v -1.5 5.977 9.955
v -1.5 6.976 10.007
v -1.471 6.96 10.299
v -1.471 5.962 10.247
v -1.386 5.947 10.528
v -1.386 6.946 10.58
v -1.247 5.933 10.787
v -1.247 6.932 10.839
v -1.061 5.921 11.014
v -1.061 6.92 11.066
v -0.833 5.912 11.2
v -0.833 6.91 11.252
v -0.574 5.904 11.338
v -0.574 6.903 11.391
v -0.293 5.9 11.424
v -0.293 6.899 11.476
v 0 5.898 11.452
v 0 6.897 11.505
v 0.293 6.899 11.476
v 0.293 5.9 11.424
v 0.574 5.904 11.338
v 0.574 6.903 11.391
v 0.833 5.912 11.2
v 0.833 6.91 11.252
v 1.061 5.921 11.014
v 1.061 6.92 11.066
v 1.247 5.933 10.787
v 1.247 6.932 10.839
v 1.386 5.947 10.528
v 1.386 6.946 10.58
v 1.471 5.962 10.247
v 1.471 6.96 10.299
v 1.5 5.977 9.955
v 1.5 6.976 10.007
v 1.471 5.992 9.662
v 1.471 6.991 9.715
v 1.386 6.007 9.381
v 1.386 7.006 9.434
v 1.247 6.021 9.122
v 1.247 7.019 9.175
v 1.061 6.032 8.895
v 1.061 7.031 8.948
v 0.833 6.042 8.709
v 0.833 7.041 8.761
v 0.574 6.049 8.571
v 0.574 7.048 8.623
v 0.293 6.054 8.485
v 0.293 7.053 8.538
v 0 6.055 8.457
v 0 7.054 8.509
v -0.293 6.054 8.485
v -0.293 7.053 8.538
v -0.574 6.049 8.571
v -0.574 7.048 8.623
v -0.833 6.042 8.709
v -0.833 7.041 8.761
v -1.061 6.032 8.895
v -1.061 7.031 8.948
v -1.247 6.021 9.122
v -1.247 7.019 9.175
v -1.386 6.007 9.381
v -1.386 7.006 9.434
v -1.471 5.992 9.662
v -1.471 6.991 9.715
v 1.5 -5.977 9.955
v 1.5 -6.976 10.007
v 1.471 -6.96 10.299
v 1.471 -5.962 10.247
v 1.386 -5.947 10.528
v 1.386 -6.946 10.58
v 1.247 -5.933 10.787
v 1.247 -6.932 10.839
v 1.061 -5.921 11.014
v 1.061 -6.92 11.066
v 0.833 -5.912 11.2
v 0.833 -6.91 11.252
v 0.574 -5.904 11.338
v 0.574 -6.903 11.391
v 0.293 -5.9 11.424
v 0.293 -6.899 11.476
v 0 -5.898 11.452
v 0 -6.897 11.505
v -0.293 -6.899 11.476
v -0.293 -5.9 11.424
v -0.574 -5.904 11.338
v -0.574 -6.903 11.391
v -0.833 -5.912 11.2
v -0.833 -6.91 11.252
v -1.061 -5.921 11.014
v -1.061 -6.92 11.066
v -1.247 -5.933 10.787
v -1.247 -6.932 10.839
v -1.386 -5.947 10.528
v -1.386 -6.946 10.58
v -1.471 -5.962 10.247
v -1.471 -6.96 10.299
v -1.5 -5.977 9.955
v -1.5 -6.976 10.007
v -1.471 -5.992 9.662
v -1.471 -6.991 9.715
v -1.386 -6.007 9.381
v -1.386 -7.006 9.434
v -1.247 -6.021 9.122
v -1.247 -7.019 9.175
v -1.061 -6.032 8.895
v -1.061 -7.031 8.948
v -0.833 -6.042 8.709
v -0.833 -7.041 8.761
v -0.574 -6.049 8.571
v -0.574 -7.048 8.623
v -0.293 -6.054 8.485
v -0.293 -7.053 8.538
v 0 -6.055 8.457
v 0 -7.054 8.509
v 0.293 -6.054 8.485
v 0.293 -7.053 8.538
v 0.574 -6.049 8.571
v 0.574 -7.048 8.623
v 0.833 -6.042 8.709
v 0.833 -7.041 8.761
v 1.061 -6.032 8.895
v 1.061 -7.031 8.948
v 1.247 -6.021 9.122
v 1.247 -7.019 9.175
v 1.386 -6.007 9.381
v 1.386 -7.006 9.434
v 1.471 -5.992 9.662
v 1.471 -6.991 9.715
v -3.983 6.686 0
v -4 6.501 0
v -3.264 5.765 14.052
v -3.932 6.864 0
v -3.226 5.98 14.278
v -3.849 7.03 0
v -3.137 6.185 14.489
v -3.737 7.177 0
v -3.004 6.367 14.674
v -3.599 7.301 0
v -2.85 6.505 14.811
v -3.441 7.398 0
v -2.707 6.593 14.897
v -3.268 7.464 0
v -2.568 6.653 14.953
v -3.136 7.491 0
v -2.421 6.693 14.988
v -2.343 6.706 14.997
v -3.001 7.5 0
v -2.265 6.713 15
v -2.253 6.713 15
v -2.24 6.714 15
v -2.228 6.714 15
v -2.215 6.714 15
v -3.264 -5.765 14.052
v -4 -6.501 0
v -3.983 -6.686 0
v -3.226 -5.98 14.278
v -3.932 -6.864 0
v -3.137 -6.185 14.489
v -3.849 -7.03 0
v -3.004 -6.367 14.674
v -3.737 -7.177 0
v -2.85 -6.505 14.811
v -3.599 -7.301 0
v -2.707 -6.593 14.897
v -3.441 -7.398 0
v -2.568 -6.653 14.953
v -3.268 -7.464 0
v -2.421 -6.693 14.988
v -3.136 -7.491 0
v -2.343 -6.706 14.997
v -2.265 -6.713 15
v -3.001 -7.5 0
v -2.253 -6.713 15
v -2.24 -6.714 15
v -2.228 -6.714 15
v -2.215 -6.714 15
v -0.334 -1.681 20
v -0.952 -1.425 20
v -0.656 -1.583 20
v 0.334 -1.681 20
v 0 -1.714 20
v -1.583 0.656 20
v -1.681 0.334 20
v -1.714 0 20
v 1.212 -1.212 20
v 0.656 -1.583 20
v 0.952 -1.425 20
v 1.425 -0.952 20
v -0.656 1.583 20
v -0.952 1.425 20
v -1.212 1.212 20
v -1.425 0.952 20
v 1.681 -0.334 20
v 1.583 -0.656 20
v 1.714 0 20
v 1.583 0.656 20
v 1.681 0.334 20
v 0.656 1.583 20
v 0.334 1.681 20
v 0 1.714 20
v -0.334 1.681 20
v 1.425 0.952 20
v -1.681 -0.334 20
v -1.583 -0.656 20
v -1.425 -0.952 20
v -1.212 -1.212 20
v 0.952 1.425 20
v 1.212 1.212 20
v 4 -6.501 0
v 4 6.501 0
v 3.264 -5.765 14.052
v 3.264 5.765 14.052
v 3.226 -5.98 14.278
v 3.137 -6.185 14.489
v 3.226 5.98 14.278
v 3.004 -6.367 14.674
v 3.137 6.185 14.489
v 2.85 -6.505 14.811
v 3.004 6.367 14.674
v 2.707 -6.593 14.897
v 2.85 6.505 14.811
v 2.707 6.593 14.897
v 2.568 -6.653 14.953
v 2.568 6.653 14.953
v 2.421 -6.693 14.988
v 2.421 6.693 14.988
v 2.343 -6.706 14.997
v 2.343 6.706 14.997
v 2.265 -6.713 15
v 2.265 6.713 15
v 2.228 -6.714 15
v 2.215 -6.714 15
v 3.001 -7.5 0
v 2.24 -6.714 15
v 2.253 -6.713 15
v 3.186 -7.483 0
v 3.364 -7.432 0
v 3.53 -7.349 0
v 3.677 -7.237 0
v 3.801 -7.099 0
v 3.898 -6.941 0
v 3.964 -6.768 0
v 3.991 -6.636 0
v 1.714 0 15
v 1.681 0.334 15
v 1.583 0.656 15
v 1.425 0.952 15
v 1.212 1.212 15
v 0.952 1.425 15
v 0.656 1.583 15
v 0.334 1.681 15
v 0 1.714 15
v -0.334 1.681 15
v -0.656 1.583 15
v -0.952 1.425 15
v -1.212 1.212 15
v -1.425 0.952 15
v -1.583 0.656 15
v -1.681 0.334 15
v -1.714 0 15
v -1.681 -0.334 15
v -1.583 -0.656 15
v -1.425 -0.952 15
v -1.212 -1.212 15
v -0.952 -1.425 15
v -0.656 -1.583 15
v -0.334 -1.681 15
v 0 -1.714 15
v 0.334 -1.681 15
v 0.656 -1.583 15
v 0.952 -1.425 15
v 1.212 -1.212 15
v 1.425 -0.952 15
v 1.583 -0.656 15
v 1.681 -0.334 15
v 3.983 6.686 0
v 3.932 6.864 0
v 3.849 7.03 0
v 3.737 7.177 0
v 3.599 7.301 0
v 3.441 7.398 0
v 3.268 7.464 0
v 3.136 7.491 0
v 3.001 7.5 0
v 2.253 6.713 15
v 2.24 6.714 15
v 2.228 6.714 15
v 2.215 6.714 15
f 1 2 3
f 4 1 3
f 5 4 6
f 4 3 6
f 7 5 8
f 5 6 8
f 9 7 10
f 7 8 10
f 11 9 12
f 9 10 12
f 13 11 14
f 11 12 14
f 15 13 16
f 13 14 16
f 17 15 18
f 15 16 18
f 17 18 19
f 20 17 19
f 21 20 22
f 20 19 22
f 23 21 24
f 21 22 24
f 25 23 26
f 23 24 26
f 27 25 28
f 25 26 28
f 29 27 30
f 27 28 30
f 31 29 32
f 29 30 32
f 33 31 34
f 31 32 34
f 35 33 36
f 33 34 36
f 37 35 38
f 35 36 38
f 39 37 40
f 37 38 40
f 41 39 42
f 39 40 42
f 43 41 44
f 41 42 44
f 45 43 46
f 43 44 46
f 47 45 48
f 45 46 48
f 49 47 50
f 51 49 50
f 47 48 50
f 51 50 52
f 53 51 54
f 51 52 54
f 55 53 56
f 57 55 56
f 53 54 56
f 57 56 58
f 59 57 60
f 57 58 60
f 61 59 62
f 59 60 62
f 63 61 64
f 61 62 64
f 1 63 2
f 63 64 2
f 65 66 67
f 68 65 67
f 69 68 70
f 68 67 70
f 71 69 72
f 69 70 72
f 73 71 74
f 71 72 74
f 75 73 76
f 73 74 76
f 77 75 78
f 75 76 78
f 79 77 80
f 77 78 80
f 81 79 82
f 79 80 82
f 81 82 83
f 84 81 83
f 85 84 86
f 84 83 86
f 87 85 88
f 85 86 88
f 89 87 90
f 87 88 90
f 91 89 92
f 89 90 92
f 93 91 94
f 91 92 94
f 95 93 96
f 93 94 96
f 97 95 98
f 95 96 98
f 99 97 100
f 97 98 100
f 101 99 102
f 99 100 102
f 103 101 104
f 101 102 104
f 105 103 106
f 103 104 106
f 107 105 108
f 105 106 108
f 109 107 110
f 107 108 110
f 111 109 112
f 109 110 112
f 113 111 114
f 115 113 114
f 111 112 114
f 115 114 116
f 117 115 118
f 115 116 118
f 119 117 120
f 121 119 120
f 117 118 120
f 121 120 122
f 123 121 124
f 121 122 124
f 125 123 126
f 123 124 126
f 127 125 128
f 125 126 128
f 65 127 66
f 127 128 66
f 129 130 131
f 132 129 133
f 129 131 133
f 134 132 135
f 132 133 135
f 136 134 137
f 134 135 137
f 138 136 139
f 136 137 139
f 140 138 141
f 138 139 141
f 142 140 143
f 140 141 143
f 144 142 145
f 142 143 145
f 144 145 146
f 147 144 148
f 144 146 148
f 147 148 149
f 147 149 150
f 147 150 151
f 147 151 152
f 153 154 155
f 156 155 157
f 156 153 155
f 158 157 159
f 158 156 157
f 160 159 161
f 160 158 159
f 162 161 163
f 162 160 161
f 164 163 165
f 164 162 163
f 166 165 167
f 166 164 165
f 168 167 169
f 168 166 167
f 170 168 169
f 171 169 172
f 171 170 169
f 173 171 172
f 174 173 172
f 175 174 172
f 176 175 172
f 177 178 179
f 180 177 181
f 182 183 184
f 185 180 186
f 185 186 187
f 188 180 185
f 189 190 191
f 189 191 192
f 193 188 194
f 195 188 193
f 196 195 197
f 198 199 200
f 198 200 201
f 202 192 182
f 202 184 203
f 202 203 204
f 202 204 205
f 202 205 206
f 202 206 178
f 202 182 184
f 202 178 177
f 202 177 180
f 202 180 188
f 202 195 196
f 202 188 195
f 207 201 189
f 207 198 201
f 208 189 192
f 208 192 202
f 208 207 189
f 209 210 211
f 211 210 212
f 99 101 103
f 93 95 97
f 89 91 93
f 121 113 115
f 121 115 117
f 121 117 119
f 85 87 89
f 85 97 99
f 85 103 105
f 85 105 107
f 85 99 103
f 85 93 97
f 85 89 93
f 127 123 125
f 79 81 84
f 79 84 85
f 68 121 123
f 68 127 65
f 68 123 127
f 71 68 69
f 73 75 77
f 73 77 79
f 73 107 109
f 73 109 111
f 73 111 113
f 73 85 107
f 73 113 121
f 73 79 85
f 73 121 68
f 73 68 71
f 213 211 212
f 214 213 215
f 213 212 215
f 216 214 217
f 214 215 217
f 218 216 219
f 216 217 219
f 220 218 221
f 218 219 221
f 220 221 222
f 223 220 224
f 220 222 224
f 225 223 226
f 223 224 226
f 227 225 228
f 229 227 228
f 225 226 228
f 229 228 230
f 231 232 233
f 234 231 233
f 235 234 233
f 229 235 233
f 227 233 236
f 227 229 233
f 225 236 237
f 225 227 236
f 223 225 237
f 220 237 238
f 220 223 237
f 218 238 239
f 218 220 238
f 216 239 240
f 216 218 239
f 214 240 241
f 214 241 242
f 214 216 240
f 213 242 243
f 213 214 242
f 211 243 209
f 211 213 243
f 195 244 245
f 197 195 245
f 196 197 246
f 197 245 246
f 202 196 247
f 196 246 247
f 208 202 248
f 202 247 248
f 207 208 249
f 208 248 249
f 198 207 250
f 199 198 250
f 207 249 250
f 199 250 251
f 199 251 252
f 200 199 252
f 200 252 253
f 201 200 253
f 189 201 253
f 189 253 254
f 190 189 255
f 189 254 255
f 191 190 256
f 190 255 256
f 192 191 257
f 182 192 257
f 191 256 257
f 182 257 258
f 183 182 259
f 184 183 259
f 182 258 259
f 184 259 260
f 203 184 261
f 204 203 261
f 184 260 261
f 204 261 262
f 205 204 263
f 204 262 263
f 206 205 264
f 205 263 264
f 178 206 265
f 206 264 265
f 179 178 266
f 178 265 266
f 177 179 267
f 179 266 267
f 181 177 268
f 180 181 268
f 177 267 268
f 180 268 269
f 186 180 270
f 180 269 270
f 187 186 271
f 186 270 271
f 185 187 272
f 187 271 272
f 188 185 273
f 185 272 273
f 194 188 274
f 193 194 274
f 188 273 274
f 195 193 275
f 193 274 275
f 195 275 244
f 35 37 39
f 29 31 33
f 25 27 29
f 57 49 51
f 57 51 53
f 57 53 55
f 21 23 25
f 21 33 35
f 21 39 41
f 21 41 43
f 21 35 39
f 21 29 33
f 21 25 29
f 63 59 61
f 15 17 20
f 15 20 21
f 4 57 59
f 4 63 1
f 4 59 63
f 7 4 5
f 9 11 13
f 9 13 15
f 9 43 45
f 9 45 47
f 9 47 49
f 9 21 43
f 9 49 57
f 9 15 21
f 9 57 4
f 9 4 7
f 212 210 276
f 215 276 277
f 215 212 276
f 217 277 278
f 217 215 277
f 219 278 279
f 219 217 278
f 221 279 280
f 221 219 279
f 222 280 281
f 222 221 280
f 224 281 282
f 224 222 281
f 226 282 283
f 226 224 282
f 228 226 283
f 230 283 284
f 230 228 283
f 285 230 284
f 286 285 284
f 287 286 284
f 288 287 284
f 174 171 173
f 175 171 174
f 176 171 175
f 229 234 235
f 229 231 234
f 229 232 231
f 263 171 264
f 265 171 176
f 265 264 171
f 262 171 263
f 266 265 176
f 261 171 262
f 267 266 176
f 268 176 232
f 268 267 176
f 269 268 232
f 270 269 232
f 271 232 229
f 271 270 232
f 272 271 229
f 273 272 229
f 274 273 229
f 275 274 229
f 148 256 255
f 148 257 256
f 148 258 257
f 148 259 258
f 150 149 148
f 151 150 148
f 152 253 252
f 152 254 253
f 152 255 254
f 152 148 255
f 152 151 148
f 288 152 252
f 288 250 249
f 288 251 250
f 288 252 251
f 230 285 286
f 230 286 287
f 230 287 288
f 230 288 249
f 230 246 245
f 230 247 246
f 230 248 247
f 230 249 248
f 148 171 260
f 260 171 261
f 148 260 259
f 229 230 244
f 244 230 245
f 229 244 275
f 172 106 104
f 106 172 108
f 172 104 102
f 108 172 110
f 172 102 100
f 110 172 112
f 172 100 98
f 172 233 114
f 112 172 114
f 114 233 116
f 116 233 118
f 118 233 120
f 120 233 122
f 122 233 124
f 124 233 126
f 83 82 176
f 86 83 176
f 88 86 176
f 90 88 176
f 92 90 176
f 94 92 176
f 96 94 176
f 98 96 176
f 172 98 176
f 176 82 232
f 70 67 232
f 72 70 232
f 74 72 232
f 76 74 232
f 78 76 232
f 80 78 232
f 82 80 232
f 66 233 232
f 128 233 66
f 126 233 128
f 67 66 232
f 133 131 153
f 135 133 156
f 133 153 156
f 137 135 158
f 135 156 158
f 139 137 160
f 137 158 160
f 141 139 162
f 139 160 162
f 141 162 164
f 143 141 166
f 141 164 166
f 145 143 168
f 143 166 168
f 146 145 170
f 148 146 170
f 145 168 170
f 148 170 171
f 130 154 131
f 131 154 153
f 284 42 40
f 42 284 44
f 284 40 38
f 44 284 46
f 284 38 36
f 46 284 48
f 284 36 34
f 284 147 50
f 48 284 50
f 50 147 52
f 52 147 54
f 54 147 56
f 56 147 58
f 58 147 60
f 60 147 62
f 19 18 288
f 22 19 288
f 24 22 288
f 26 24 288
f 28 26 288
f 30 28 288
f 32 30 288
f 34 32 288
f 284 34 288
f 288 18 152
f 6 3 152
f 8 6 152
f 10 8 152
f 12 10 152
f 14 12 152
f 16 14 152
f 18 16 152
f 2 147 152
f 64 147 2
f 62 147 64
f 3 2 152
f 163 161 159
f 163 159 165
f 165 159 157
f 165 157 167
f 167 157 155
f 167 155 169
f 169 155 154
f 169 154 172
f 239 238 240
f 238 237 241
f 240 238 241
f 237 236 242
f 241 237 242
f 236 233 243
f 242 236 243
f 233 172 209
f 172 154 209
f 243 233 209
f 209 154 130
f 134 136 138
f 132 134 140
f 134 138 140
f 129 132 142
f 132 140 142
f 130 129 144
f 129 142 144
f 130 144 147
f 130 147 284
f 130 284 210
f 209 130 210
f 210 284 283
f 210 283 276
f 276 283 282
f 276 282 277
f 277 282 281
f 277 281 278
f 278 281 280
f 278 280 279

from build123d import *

# Parameters (mm, degrees)
F0_W     = 8
F0_H     = 15
F1_DEPTH = 15
F1_TAPER = 3
F2_R     = 1.7138833108
F3_DEPTH = 5
F4_R     = 1.5
F5_DEPTH = 1
F6_R     = 1.5
F7_DEPTH = 1
F8_R     = 1


with BuildPart() as f1:
    # F0 (on Top) → F1 (new body)
    with BuildSketch(Plane.XY):
        Rectangle(F0_W, F0_H)
    extrude(amount=F1_DEPTH, taper=F1_TAPER)

    # F2 (on face) → F3 (join)
    with BuildSketch(Plane.XY.offset(15)):
        Circle(F2_R)
    extrude(amount=F3_DEPTH)

    # F4 (on face) → F5 (cut)
    with BuildSketch(Plane(origin=(0, 7.4794571076, 0.3919817373), x_dir=(-1, 0, 0), z_dir=(0, 0.9986295348, 0.0523359562))):
        with Locations((0, 9.6280655181)):
            Circle(F4_R)
    extrude(amount=-F5_DEPTH, mode=Mode.SUBTRACT)

    # F6 (on face) → F7 (cut)
    with BuildSketch(Plane(origin=(0, -7.4794571076, 0.3919817373), x_dir=(1, 0, 0), z_dir=(0, -0.9986295348, 0.0523359562))):
        with Locations((0, 9.6280655181)):
            Circle(F6_R)
    extrude(amount=-F7_DEPTH, mode=Mode.SUBTRACT)

    # F8
    f8_edges = [f1.edges().sort_by_distance(p)[0] for p in [
        (-3.213883, 0, 15),
        (-3.606942, 7.106942, 7.5),
        (-3.606942, -7.106942, 7.5),
        (3.213883, 0, 15),
        (3.606942, -7.106942, 7.5),
        (3.606942, 7.106942, 7.5),
    ]]
    fillet(f8_edges, radius=F8_R)


solid = f1.part
